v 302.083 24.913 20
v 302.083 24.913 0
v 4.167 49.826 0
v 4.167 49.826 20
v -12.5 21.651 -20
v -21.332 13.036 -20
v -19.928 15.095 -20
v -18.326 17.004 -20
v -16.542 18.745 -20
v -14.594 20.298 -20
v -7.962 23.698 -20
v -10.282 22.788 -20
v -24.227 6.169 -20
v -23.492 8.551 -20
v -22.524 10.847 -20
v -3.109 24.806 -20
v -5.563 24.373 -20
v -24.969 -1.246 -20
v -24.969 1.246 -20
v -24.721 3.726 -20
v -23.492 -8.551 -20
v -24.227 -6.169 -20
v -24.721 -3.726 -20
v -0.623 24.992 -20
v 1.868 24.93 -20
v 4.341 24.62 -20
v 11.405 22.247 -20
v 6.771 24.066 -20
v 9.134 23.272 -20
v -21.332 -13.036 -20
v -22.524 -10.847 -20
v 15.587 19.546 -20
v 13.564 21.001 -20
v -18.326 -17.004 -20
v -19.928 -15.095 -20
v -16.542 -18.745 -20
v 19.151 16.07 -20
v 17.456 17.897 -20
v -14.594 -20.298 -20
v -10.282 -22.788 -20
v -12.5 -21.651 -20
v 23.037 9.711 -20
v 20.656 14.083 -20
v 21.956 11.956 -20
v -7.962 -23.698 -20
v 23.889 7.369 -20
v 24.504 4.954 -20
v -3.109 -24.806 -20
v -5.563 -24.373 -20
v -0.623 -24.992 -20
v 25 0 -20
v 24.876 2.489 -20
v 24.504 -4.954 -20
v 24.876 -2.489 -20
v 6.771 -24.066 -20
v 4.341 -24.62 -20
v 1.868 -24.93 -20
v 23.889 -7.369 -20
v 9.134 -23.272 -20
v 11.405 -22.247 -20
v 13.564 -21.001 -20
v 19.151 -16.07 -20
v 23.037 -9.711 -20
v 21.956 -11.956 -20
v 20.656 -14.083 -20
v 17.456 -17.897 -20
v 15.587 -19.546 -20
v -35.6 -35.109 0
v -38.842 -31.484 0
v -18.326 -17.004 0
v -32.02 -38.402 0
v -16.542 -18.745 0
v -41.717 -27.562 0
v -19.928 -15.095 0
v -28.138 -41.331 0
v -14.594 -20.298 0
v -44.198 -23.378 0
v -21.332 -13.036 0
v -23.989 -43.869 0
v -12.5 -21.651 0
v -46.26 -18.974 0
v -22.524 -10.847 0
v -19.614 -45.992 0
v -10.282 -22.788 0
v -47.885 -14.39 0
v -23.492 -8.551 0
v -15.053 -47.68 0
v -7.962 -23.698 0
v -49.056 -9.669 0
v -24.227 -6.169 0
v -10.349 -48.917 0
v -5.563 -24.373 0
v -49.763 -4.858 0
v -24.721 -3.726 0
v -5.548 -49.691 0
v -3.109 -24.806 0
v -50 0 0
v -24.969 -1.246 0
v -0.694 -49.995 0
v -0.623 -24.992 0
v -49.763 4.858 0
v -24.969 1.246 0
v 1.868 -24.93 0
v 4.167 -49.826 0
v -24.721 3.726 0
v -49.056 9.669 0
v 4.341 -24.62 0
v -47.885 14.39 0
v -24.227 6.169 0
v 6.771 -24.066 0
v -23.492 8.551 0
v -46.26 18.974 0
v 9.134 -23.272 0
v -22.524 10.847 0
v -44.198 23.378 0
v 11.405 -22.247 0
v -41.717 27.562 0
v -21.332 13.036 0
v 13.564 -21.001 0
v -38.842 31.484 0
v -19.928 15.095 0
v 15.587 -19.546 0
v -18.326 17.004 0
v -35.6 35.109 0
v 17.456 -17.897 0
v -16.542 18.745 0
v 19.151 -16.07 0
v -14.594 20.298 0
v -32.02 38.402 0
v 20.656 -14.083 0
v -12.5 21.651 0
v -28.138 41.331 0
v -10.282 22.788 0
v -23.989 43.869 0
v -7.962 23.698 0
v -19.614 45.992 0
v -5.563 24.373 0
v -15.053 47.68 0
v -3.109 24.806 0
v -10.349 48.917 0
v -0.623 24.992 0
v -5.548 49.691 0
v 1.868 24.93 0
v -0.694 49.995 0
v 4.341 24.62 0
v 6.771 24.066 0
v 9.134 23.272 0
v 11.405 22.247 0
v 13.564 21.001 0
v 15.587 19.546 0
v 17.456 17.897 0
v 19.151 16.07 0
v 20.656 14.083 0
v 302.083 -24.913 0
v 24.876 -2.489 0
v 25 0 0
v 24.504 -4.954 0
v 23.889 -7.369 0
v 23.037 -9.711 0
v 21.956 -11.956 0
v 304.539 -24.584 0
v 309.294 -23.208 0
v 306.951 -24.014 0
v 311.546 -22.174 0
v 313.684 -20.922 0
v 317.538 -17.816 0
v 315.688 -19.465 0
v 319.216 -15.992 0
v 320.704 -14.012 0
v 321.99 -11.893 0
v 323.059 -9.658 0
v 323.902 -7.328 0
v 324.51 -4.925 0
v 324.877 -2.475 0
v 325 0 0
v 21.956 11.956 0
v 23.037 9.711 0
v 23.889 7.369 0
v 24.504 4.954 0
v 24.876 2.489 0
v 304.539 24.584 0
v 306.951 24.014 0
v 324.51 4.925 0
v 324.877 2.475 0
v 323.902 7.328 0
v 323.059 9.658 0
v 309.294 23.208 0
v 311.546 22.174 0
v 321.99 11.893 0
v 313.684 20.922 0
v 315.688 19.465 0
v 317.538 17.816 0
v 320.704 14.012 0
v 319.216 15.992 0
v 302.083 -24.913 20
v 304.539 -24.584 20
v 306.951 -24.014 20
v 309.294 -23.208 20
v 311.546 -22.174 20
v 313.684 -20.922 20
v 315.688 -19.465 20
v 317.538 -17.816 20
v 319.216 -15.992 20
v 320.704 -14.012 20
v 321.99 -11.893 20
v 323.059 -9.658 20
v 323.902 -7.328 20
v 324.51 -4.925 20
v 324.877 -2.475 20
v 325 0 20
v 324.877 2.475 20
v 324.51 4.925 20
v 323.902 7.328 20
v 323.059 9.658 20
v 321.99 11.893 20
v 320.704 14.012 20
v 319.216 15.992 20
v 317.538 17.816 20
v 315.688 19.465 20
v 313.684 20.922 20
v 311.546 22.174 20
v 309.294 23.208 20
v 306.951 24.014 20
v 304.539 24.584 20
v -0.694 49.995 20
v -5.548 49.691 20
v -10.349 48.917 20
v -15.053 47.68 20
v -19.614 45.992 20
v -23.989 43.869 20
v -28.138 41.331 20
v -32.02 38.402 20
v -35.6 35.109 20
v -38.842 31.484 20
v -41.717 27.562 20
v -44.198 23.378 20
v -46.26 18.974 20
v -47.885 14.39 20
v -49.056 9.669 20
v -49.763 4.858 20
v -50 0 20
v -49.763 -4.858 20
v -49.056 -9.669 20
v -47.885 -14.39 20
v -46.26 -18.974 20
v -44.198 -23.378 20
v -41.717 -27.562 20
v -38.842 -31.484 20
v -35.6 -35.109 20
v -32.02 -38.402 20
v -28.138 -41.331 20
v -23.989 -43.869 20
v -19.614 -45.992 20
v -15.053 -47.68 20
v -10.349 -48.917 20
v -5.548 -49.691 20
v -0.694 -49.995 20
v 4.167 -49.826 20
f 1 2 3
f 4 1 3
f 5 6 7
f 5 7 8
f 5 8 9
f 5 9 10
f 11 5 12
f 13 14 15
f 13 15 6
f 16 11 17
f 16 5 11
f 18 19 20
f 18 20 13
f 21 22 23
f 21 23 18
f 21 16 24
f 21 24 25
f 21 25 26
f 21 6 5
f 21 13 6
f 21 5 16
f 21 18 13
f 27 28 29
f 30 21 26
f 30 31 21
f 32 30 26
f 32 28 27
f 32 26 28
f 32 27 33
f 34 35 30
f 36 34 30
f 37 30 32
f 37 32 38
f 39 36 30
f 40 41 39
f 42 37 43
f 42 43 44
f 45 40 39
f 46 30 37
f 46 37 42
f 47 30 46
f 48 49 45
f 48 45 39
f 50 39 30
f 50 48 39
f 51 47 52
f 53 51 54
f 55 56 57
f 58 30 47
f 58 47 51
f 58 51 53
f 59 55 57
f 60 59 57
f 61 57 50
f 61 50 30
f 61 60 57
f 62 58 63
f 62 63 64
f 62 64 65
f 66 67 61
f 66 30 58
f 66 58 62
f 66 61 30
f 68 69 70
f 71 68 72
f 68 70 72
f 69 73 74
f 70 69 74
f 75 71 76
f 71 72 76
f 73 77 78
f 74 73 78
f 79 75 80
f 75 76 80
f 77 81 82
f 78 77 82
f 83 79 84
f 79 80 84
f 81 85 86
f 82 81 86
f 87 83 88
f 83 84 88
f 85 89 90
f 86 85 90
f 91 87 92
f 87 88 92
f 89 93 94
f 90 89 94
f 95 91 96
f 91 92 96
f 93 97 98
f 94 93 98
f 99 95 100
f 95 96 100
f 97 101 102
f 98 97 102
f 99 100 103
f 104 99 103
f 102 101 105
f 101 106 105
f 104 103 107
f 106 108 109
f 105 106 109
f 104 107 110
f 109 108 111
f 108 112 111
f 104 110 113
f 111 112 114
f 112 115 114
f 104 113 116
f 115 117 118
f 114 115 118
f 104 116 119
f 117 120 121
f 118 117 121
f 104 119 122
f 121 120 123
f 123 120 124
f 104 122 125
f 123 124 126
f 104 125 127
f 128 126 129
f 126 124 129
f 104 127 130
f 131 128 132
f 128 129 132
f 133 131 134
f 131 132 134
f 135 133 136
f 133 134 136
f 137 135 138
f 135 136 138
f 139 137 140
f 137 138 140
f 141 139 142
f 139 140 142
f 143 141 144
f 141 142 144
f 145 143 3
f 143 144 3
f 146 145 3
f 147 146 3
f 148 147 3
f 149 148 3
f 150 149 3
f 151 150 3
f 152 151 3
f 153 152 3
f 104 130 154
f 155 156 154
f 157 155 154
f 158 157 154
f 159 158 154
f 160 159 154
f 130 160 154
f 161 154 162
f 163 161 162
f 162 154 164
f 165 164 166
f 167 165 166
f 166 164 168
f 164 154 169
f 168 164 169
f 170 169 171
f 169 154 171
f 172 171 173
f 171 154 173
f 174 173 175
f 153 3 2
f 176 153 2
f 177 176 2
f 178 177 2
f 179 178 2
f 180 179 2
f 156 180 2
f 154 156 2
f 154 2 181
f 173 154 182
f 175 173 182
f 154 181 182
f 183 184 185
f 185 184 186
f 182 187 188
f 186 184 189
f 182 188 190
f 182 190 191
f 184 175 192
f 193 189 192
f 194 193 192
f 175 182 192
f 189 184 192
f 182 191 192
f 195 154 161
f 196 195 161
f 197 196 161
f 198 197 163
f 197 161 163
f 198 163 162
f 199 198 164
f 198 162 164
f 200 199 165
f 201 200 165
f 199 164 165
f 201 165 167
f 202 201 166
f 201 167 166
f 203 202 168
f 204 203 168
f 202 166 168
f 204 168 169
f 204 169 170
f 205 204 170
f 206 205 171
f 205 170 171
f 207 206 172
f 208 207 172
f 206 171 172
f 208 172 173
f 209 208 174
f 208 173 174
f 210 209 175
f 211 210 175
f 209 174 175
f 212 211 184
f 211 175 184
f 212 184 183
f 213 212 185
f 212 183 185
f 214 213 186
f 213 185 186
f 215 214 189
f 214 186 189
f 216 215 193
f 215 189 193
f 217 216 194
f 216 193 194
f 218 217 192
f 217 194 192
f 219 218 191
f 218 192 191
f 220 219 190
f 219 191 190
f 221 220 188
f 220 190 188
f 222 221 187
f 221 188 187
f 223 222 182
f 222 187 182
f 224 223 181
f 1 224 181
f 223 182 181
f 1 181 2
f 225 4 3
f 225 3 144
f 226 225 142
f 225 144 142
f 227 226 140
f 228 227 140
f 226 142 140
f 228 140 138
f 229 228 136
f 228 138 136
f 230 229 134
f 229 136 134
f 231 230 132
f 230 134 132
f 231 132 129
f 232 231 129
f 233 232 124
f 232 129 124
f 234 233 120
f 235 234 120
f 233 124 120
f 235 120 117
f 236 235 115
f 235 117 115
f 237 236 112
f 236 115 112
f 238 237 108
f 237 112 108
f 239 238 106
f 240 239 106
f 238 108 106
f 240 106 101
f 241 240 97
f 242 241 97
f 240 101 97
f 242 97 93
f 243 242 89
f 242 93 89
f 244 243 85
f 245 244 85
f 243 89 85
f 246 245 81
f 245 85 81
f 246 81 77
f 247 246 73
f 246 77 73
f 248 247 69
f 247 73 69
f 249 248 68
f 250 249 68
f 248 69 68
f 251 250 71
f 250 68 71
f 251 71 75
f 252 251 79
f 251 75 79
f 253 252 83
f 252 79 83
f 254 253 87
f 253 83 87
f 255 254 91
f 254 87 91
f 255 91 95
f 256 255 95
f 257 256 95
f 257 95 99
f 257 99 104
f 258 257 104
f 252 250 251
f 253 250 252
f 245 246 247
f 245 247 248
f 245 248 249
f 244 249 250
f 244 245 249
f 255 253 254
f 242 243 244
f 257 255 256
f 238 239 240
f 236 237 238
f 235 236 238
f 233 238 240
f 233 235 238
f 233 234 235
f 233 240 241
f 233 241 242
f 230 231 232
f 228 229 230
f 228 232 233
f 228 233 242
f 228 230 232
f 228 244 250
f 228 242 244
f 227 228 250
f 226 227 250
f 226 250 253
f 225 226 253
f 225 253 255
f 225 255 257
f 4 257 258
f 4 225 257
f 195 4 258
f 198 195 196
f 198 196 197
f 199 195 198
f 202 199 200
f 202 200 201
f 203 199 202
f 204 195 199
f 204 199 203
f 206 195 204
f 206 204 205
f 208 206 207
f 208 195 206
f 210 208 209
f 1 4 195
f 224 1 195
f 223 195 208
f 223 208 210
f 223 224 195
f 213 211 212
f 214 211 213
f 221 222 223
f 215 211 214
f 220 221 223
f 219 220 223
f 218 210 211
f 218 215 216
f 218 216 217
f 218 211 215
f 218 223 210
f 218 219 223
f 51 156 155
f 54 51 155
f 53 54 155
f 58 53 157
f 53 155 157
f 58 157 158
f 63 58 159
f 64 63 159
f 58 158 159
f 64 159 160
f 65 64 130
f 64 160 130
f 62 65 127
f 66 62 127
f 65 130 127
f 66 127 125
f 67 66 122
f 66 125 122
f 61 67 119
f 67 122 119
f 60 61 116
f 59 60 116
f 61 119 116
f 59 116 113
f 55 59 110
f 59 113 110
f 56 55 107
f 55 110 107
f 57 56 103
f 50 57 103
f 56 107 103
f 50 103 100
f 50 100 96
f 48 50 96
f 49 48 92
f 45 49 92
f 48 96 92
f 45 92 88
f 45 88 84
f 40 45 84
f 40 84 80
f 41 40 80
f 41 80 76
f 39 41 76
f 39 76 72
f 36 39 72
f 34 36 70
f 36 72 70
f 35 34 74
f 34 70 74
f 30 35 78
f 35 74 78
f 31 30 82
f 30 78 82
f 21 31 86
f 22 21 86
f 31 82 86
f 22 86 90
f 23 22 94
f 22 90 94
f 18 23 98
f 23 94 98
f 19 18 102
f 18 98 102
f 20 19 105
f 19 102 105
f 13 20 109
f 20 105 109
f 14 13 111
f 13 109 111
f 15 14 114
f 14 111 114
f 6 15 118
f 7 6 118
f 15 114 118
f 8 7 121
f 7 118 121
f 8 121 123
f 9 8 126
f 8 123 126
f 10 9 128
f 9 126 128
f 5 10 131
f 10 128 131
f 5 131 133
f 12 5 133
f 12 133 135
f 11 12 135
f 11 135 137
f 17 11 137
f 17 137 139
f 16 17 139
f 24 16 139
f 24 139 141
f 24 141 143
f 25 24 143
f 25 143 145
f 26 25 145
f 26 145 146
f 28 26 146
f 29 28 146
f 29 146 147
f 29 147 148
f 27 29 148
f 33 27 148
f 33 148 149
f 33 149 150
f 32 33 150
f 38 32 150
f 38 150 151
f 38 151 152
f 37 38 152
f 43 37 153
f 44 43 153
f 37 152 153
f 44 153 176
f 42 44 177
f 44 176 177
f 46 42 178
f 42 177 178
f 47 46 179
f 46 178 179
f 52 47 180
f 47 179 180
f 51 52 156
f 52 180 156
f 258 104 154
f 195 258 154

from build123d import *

# Parameters (mm, degrees)
SKETCH_1_R      = 50
SKETCH_1_R_2    = 25
EXTRUDE_1_DEPTH = 20
SKETCH_2_R      = 25
EXTRUDE_2_DEPTH = 20


with BuildPart() as part:
    # 草图1 → 凸台-拉伸1 (new body)
    with BuildSketch(Plane.XY):
        Circle(SKETCH_1_R)
        with BuildLine():
            Line((302.083333333, 24.913043215), (4.166666667, 49.82608643))
            ThreePointArc((4.166666667, 49.82608643), (36.79900361, 33.850160019), (50, 0))
            ThreePointArc((50, 0), (36.79900361, -33.850160019), (4.166666667, -49.82608643))
            Line((4.166666667, -49.82608643), (302.083333333, -24.913043215))
            ThreePointArc((302.083333333, -24.913043215), (275, 0), (302.083333333, 24.913043215))
        make_face()
        with Locations((300, 0)):
            Circle(SKETCH_1_R_2)
    extrude(amount=EXTRUDE_1_DEPTH)

    # 草图2 → 凸台-拉伸2 (add)
    with BuildSketch(Plane(origin=(0, 0, 0), x_dir=(-1, 0, 0), z_dir=(0, 0, -1))):
        with Locations(Location((0, 0, 0), (0, 0, 180))):
            Circle(SKETCH_2_R)
    extrude(amount=EXTRUDE_2_DEPTH)


solid = part.part
